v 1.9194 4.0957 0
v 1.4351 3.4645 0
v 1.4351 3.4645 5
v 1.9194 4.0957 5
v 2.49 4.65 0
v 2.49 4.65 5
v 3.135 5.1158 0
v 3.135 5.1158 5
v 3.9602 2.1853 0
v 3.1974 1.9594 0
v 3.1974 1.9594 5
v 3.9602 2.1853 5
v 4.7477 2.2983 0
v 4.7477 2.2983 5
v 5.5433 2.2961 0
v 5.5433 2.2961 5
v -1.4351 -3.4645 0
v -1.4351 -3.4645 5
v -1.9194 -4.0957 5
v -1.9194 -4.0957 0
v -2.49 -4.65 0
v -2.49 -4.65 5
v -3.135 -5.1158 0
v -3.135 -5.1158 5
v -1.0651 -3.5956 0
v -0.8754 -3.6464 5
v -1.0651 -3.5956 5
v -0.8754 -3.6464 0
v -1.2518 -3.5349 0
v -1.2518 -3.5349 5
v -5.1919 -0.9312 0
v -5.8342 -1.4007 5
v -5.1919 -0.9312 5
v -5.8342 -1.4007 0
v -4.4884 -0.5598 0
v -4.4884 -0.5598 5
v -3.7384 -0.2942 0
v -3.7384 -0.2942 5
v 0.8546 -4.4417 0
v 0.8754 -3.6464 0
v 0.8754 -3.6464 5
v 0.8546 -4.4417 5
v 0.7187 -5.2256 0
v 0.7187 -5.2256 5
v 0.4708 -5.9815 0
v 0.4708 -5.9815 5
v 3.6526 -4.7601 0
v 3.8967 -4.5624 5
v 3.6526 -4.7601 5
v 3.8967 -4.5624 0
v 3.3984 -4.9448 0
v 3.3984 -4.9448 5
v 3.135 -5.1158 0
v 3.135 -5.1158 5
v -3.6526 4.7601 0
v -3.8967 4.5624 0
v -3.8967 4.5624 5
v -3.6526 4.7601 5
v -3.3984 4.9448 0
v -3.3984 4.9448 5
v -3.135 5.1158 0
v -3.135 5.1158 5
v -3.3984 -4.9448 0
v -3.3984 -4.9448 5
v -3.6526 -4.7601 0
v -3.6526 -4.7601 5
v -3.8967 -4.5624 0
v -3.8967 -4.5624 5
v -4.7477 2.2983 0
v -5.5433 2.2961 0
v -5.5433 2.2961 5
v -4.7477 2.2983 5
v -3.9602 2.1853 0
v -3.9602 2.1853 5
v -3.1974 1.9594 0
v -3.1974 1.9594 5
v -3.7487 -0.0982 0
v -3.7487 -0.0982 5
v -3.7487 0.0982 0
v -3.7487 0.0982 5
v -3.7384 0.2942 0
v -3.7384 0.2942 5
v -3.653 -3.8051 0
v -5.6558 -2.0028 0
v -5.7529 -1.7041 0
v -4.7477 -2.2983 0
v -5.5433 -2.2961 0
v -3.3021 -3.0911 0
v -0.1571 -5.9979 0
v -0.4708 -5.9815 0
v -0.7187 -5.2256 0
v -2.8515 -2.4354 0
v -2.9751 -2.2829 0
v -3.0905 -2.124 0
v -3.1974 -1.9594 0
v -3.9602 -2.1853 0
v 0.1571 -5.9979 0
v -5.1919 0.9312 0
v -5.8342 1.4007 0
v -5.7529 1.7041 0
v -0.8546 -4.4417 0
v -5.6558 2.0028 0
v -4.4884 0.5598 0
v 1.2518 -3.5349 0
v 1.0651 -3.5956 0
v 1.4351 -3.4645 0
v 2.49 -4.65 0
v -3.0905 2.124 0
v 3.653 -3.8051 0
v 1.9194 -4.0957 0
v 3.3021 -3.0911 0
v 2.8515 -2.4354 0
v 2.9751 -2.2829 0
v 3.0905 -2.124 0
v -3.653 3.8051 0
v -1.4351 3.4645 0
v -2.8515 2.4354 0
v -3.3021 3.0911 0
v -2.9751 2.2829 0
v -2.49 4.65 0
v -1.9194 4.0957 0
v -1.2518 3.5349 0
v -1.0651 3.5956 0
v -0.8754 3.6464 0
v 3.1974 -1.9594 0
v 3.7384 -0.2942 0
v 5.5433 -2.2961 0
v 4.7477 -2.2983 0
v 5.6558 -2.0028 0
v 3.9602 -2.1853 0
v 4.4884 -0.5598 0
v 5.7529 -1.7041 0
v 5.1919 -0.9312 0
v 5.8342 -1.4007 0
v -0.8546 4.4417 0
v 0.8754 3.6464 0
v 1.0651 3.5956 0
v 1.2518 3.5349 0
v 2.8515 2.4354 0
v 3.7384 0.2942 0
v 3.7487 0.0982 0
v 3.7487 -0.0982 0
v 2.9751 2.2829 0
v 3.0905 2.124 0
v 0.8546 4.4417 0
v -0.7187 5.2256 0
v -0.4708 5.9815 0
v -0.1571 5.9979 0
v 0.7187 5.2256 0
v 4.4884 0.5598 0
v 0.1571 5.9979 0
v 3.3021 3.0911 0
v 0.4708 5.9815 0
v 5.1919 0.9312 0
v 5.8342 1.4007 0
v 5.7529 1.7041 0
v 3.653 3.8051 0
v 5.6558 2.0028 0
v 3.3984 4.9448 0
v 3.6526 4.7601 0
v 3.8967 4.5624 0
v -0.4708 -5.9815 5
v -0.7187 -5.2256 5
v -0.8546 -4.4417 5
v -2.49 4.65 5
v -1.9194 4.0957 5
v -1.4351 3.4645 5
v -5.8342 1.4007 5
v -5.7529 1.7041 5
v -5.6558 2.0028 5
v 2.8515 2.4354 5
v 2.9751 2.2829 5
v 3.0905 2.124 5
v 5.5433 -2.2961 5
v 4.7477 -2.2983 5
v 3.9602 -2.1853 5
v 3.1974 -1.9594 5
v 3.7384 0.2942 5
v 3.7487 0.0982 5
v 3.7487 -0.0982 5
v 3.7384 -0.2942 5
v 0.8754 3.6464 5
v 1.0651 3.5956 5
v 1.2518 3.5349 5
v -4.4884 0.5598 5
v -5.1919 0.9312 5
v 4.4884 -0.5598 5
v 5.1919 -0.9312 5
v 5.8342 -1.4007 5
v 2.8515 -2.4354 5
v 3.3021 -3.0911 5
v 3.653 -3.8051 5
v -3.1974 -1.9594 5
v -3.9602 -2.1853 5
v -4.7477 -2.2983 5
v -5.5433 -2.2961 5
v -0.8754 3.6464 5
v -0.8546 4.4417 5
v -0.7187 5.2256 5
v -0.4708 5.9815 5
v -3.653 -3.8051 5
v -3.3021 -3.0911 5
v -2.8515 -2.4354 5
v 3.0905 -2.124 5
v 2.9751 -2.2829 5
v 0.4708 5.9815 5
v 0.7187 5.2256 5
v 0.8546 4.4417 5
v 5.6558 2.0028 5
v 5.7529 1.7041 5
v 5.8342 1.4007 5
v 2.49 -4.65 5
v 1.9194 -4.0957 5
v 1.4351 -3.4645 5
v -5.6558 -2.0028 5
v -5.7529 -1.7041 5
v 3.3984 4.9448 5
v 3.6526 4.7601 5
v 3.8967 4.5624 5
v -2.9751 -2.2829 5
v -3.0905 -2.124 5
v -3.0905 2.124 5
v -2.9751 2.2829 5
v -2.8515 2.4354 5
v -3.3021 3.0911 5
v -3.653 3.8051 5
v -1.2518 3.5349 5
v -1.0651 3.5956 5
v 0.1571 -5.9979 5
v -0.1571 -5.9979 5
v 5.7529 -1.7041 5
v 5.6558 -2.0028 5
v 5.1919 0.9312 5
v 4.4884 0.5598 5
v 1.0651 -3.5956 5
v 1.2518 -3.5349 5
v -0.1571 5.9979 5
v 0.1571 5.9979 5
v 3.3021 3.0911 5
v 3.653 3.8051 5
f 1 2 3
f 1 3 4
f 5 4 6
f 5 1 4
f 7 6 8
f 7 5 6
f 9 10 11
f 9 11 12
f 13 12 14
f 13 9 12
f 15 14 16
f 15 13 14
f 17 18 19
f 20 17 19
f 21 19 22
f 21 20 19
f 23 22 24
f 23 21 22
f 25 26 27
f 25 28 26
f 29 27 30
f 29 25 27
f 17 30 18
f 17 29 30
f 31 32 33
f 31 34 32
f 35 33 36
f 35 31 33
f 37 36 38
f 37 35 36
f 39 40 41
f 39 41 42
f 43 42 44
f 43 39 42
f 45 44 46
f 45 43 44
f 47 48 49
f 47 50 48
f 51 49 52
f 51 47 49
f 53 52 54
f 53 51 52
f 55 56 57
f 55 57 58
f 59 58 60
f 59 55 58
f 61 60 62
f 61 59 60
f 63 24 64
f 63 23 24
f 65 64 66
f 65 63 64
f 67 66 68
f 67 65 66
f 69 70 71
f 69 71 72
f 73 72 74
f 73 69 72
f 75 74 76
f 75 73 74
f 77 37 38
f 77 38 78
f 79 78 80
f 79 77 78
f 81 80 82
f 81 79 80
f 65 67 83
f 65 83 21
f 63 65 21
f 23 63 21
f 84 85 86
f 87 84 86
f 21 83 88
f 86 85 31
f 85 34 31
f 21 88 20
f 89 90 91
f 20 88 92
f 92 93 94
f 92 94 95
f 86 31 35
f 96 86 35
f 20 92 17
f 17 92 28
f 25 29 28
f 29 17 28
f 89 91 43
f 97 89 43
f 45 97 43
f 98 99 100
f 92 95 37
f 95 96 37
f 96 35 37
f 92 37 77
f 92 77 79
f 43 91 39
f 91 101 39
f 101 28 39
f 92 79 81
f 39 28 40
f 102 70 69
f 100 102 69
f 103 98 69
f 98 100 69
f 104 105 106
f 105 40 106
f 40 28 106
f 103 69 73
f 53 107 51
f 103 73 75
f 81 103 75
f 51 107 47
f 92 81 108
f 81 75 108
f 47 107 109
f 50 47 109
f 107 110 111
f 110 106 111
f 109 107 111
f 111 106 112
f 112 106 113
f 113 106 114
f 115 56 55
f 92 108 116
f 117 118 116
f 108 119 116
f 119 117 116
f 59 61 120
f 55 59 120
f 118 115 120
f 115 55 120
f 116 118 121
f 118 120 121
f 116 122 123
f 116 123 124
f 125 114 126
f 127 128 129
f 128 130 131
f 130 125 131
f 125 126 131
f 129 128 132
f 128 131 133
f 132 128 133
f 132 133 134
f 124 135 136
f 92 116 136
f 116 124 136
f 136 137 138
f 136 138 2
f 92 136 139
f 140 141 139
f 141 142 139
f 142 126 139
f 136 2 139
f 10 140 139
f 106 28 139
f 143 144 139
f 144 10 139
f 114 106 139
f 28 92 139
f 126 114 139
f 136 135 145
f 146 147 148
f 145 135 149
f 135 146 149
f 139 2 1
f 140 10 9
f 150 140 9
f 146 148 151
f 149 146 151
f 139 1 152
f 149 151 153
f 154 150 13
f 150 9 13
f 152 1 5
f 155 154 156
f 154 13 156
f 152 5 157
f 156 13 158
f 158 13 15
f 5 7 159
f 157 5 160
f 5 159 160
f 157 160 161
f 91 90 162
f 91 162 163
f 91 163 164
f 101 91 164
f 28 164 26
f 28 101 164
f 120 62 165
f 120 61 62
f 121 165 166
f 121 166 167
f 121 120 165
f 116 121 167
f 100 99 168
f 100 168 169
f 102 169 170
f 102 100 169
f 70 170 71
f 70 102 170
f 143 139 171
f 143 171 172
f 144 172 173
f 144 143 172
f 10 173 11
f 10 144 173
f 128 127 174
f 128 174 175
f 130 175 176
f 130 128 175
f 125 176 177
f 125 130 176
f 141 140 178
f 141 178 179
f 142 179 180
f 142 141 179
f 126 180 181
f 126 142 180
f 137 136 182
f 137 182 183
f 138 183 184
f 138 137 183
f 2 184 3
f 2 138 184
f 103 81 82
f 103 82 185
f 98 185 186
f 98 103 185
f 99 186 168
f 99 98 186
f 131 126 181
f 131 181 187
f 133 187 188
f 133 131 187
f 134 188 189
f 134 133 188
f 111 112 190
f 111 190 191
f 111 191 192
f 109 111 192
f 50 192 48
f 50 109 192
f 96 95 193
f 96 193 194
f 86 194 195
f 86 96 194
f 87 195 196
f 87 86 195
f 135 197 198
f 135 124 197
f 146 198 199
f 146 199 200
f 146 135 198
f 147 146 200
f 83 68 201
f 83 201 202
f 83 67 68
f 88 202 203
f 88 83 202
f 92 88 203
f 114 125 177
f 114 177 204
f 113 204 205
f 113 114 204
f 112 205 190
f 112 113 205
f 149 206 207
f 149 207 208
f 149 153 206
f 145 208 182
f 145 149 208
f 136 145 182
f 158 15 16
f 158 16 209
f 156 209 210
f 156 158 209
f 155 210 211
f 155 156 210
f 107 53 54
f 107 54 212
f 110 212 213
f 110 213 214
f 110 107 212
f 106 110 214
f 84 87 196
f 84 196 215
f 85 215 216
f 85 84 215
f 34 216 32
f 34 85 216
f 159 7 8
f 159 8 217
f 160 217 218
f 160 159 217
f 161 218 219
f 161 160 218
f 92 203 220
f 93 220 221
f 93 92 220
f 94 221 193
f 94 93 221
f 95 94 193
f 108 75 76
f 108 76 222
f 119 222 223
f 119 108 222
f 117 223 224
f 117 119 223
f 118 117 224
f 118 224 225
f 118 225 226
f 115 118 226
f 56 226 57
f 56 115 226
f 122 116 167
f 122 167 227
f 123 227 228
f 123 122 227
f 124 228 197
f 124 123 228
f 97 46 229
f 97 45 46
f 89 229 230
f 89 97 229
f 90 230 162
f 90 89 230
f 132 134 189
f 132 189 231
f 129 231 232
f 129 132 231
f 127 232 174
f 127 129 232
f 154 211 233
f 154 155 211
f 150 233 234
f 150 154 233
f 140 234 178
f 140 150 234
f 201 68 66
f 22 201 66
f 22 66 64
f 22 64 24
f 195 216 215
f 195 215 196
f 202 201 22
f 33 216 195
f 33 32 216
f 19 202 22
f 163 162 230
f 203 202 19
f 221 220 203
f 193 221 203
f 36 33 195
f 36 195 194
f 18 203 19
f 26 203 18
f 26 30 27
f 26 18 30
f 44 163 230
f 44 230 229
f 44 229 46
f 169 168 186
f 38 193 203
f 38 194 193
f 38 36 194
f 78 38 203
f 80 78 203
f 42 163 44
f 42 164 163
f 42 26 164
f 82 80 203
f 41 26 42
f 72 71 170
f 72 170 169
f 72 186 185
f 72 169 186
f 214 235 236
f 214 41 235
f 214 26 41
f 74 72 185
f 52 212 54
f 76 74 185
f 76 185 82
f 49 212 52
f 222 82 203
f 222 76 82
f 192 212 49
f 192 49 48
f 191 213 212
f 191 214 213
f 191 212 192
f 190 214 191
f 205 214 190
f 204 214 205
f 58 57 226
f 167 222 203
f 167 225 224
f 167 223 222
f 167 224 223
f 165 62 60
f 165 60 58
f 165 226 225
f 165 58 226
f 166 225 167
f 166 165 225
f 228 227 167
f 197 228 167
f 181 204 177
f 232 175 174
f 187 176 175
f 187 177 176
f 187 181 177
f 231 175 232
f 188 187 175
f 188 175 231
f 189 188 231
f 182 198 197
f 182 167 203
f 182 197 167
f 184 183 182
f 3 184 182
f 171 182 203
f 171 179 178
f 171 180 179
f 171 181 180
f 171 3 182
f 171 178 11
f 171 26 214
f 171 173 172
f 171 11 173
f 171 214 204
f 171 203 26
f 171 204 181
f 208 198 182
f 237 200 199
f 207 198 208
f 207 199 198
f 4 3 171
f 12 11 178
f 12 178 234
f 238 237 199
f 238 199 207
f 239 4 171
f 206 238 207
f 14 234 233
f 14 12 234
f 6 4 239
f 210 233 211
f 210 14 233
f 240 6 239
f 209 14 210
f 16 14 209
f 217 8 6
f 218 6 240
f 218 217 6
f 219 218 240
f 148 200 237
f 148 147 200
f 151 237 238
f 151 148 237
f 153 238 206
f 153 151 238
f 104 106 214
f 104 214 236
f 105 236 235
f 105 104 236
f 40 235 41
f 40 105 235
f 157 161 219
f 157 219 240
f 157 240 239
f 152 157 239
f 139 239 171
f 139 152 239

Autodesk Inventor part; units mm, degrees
sketch "Sketch1" plane through (0, 0, 0) normal (0, 0, 1) x (1, 0, 0)
  circle A0 centre (0, 0) radius 6
  dimension "d0" = 12
extrude "Extrusion1" add sketch "Sketch1" along normal blind 5
ref_plane "Work Plane2" through (0, 0, 2.5) normal (0, 0, 1) x (1, 0, 0)
sketch "Sketch2" plane through (0, 0, 0) normal (0, 0, -1) x (-1, 0, 0)
  circle A0 centre (0, 0) radius 6 projected
  circle A1 centre (0, 0) radius 5
  dimension "d3" = 10
surface extrude "Diámetro de separación" sketch "Sketch2" against normal through all shown no curves A1
ref_plane "Work Plane8" through (0, 0, 0) normal (0.9510565, 0.309017, 0) x (0, 0, 1)
ref_plane "Work Plane9" through (0, 0, 0) normal (1, 0, 0) x (0, 1, 0)
spur gear teeth "Engranaje recto" teeth 10 pitch diameter 10 tip diameter 12 root diameter 7.5 face width 5 start plane through (0, 0, 0) normal (0, 0, -1) x (-1, 0, 0)
equation "\"d0\" = da_da"
equation "\"d1\" = da_b"
equation "\"d3\" = da_d"
equation "\"da_da\" = 12"
equation "\"da_b\" = 5"
equation "\"da_d\" = 10"
properties part number "Engranaje recto1" material "Steel"
